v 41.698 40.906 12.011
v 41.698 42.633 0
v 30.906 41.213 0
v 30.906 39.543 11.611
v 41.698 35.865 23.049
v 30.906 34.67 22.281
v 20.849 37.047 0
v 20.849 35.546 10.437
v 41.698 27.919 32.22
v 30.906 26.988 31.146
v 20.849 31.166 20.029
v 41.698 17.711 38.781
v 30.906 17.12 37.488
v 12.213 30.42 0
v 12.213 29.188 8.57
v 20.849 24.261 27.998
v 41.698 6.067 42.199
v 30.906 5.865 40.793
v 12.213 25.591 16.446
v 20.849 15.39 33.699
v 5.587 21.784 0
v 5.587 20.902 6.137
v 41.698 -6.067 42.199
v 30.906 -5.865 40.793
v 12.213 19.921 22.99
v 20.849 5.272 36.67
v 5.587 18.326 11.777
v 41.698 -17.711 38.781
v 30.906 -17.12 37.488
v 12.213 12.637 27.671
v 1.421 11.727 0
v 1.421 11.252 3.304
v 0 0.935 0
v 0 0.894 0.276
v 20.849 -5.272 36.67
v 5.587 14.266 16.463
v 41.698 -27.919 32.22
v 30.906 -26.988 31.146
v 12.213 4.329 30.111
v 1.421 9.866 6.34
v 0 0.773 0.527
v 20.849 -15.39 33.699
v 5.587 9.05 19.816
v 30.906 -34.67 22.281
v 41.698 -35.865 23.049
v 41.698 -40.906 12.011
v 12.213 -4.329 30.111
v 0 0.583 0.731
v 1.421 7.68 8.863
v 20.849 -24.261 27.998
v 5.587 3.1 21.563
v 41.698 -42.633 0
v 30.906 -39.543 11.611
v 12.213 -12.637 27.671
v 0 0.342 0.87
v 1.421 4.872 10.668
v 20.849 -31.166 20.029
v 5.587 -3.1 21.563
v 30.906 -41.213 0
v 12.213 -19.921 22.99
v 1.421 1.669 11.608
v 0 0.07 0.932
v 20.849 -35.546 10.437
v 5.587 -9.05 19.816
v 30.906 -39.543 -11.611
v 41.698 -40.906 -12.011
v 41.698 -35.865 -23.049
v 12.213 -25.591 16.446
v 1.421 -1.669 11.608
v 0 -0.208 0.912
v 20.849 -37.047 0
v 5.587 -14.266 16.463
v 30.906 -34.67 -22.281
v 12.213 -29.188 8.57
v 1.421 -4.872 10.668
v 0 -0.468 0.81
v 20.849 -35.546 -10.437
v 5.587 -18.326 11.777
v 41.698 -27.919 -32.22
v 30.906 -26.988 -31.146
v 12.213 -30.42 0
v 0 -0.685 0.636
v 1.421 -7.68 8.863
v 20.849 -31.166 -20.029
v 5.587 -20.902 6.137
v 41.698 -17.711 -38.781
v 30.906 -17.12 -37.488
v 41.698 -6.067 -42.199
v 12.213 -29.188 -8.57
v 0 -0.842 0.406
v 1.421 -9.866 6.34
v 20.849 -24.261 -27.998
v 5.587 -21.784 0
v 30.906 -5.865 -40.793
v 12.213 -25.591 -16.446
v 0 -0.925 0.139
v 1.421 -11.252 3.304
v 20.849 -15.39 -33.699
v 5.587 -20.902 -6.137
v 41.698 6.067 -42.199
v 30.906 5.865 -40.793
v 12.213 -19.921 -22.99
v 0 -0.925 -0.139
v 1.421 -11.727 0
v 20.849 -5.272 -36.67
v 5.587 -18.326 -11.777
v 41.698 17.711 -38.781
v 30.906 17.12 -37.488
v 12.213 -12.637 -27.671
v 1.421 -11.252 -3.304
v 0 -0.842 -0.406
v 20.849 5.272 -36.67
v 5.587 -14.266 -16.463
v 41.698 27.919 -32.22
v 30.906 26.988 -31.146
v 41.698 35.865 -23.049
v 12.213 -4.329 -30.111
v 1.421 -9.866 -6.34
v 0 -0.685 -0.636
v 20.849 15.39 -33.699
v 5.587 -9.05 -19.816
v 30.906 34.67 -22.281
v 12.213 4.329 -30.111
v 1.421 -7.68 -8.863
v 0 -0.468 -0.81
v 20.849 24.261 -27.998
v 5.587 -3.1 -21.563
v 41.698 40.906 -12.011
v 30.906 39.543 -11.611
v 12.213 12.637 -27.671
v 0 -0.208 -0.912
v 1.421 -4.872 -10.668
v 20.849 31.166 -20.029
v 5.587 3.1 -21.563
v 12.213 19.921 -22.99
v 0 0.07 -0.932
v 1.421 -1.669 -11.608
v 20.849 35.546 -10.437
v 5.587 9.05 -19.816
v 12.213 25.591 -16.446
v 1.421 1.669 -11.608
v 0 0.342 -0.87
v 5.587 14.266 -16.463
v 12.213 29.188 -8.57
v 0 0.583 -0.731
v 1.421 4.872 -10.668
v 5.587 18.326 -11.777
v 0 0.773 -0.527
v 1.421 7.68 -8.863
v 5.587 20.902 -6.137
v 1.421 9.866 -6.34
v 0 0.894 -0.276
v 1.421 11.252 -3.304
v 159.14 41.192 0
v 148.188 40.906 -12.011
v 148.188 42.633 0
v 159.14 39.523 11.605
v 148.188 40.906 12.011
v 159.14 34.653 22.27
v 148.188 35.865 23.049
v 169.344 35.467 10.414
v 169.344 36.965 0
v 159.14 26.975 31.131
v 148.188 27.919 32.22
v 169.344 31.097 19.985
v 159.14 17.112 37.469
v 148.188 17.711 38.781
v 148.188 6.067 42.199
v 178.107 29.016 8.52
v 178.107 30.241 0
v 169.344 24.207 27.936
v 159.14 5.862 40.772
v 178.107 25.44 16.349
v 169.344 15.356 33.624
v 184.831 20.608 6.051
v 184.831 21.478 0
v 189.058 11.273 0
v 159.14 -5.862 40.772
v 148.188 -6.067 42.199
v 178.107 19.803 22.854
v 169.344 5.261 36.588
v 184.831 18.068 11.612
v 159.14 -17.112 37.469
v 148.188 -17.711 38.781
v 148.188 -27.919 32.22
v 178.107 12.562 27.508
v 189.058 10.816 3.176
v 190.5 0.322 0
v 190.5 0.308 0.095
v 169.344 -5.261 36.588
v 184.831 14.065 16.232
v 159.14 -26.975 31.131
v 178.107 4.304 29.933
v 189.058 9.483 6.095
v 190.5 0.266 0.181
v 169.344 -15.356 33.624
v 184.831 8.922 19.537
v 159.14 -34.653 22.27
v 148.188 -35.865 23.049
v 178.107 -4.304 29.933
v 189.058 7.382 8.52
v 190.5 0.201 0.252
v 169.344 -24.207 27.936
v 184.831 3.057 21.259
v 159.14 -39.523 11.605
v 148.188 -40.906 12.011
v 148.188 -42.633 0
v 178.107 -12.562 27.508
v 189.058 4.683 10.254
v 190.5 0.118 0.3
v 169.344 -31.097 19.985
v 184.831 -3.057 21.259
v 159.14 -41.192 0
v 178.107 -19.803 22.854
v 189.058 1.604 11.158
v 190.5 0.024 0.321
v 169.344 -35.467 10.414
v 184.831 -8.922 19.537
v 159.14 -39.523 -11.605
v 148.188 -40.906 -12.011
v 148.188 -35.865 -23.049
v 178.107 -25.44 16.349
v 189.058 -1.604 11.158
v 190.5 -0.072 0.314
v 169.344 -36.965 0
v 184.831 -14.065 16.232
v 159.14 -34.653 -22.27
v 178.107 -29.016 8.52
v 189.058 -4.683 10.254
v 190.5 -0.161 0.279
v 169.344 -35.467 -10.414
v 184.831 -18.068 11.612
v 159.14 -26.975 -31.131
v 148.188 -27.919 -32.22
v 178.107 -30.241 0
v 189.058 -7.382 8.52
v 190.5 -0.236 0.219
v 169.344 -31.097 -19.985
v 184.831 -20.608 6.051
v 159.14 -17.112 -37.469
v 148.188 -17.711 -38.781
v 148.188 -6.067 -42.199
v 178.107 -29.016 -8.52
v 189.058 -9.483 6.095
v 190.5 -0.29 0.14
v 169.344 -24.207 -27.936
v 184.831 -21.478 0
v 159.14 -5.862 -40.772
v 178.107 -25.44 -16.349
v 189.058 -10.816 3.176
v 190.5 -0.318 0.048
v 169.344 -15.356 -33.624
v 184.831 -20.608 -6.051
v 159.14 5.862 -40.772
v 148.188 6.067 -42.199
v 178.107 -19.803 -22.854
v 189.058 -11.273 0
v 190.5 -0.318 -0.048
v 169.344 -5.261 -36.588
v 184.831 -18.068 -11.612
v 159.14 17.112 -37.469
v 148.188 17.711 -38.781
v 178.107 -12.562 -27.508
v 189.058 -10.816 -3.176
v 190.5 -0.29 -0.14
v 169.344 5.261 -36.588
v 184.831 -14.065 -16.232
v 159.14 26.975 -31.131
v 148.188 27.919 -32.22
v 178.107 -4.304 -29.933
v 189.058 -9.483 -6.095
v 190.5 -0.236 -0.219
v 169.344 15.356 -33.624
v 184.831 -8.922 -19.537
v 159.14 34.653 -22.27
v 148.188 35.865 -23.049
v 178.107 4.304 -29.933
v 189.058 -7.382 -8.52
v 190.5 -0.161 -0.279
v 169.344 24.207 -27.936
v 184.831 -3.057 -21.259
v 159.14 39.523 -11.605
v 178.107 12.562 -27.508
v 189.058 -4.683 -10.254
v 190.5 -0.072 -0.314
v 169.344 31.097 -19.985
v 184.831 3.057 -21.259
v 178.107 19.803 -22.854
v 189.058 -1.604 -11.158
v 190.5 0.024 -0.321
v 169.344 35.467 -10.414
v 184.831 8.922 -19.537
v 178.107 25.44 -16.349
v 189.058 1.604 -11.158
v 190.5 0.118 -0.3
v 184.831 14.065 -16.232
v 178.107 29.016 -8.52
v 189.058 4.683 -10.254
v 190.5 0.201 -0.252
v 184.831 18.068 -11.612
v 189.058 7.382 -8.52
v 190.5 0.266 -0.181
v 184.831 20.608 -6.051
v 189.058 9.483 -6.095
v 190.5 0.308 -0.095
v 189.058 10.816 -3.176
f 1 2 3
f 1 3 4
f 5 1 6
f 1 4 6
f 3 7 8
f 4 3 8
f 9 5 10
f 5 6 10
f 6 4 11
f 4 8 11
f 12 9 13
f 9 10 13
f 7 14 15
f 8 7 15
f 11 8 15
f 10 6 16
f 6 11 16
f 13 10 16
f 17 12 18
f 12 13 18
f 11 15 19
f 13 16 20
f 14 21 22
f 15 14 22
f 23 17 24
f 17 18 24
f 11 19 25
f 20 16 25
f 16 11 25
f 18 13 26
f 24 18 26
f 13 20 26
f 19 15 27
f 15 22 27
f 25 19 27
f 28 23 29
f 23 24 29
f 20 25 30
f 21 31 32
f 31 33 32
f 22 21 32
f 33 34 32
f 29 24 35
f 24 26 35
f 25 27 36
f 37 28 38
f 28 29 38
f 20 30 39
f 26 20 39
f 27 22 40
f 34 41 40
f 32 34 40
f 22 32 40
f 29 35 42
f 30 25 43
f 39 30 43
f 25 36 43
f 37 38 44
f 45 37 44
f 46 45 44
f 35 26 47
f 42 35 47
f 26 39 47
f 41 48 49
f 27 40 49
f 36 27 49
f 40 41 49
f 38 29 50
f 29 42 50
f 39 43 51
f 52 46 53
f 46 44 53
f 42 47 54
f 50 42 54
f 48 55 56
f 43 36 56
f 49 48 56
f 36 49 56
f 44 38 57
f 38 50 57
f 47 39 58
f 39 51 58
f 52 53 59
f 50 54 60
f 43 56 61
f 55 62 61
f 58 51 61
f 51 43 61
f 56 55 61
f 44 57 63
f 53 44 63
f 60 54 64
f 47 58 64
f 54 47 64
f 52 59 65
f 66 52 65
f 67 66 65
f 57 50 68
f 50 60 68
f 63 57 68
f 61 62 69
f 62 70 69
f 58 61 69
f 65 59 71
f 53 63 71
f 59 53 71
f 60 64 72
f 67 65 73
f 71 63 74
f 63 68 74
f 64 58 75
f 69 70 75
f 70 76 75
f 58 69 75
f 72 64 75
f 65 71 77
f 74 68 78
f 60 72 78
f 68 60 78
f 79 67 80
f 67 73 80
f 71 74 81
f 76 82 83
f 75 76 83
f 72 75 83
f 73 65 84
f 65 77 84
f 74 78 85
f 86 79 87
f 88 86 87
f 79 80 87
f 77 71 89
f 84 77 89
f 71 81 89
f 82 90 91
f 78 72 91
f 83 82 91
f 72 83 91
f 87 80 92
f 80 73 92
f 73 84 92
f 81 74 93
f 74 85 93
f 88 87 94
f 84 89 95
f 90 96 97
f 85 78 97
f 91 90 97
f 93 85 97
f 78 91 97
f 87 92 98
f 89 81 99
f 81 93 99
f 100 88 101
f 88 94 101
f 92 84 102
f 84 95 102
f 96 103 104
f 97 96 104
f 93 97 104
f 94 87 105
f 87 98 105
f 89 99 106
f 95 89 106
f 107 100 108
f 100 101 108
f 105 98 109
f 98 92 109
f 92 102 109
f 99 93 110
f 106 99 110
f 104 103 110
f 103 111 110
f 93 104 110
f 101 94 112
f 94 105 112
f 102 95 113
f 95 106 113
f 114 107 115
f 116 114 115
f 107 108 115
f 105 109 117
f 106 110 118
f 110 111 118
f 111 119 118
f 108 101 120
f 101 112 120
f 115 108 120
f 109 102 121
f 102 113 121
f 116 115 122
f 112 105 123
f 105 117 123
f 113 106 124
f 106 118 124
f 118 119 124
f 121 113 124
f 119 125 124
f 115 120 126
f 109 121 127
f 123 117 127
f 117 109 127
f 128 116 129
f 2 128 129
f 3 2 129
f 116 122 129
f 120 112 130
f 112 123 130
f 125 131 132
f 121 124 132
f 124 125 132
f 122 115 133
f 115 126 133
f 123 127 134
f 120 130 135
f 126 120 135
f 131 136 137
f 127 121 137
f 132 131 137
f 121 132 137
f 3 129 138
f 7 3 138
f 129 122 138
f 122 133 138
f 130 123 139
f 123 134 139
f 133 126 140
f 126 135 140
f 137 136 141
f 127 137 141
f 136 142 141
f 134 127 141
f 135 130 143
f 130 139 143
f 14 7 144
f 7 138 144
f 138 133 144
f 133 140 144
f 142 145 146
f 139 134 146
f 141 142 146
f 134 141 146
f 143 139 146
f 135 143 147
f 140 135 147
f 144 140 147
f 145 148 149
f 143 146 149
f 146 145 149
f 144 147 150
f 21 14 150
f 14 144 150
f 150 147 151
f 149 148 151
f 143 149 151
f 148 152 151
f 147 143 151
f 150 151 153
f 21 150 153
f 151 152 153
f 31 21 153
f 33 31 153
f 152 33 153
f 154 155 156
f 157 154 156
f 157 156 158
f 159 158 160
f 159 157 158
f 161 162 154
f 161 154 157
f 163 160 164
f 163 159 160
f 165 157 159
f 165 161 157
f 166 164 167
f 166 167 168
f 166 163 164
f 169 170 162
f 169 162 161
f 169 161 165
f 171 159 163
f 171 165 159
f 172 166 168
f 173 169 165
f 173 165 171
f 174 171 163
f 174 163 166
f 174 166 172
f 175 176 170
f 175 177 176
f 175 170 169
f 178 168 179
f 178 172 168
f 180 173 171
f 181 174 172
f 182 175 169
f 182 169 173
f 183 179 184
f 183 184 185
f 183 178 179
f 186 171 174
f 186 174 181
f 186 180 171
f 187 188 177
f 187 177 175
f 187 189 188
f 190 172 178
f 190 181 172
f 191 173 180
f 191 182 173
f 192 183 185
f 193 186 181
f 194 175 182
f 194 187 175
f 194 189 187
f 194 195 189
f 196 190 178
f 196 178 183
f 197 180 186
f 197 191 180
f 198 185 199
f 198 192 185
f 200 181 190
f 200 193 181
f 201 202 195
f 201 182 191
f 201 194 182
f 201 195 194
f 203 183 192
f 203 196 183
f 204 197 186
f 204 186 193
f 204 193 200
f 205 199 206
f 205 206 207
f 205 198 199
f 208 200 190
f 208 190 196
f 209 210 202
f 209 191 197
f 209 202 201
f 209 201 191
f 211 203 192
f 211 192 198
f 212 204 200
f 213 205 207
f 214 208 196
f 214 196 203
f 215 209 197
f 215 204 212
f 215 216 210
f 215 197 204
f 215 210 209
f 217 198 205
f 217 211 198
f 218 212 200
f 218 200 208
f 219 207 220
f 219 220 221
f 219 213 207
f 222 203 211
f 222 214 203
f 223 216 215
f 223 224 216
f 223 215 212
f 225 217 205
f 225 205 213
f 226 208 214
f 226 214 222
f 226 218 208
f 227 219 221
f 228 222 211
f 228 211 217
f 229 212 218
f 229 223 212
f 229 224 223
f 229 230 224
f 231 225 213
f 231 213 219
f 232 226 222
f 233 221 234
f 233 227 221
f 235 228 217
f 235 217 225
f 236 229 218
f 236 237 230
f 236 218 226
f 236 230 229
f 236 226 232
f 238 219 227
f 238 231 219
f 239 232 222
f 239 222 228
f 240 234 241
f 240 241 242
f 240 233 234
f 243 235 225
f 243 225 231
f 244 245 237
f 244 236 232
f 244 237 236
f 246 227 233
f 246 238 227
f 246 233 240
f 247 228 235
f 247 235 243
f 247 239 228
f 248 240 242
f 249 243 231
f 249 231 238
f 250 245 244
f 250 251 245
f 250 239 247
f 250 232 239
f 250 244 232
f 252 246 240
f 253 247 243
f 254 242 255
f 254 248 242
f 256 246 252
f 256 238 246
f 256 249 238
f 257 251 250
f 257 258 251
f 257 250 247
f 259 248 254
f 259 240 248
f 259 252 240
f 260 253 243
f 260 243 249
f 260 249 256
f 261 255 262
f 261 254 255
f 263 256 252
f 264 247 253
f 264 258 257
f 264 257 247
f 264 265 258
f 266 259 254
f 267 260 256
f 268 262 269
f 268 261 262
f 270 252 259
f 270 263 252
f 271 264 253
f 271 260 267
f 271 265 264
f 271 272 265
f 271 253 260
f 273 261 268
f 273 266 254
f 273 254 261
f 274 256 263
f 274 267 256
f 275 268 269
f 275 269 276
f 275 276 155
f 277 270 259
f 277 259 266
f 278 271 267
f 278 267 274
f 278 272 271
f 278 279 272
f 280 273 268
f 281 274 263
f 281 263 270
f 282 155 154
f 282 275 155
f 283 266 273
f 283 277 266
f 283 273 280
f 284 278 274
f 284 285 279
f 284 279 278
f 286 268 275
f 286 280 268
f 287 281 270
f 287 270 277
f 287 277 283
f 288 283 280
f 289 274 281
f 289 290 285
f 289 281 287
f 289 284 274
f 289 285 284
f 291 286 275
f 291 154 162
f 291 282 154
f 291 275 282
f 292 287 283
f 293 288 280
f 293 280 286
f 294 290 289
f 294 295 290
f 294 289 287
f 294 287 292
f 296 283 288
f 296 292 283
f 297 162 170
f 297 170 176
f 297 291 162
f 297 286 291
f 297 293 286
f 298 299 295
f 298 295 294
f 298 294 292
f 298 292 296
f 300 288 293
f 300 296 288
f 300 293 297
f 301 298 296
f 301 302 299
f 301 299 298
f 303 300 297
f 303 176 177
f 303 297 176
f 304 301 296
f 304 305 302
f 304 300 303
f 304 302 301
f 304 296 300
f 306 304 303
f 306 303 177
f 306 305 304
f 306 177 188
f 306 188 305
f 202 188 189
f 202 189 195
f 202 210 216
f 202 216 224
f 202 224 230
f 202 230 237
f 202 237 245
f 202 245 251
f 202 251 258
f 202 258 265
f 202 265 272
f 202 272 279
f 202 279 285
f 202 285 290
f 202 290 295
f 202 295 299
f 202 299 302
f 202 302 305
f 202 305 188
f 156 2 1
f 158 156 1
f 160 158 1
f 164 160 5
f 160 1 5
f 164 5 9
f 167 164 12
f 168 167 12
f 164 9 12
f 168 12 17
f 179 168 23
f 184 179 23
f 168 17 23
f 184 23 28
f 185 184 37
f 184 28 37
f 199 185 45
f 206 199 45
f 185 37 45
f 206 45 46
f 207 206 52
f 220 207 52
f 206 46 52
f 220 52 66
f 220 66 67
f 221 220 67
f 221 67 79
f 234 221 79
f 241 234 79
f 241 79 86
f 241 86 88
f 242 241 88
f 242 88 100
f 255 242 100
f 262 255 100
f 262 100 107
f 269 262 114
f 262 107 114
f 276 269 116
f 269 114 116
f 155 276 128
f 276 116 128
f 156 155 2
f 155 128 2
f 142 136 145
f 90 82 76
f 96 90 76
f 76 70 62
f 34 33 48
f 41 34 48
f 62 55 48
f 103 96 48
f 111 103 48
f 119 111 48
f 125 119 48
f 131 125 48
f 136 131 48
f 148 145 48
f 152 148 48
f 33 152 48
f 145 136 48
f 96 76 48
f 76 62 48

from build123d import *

# Parameters (mm, degrees)
F0_R     = 42.633401
F1_DEPTH = 190.5
F2_R     = 42.311507
F3_R     = 41.698297


with BuildPart() as f1:
    # F0 (on Right) → F1 (new body)
    with BuildSketch(Plane.YZ):
        Circle(F0_R)
    extrude(amount=F1_DEPTH)

    # F2
    f2_edges = [f1.edges().sort_by_distance(p)[0] for p in [
        (190.5, -42.633401, 0),
    ]]
    fillet(f2_edges, radius=F2_R)

    # F3
    f3_edges = [f1.edges().sort_by_distance(p)[0] for p in [
        (0, -42.633401, 0),
    ]]
    fillet(f3_edges, radius=F3_R)


solid = f1.part
